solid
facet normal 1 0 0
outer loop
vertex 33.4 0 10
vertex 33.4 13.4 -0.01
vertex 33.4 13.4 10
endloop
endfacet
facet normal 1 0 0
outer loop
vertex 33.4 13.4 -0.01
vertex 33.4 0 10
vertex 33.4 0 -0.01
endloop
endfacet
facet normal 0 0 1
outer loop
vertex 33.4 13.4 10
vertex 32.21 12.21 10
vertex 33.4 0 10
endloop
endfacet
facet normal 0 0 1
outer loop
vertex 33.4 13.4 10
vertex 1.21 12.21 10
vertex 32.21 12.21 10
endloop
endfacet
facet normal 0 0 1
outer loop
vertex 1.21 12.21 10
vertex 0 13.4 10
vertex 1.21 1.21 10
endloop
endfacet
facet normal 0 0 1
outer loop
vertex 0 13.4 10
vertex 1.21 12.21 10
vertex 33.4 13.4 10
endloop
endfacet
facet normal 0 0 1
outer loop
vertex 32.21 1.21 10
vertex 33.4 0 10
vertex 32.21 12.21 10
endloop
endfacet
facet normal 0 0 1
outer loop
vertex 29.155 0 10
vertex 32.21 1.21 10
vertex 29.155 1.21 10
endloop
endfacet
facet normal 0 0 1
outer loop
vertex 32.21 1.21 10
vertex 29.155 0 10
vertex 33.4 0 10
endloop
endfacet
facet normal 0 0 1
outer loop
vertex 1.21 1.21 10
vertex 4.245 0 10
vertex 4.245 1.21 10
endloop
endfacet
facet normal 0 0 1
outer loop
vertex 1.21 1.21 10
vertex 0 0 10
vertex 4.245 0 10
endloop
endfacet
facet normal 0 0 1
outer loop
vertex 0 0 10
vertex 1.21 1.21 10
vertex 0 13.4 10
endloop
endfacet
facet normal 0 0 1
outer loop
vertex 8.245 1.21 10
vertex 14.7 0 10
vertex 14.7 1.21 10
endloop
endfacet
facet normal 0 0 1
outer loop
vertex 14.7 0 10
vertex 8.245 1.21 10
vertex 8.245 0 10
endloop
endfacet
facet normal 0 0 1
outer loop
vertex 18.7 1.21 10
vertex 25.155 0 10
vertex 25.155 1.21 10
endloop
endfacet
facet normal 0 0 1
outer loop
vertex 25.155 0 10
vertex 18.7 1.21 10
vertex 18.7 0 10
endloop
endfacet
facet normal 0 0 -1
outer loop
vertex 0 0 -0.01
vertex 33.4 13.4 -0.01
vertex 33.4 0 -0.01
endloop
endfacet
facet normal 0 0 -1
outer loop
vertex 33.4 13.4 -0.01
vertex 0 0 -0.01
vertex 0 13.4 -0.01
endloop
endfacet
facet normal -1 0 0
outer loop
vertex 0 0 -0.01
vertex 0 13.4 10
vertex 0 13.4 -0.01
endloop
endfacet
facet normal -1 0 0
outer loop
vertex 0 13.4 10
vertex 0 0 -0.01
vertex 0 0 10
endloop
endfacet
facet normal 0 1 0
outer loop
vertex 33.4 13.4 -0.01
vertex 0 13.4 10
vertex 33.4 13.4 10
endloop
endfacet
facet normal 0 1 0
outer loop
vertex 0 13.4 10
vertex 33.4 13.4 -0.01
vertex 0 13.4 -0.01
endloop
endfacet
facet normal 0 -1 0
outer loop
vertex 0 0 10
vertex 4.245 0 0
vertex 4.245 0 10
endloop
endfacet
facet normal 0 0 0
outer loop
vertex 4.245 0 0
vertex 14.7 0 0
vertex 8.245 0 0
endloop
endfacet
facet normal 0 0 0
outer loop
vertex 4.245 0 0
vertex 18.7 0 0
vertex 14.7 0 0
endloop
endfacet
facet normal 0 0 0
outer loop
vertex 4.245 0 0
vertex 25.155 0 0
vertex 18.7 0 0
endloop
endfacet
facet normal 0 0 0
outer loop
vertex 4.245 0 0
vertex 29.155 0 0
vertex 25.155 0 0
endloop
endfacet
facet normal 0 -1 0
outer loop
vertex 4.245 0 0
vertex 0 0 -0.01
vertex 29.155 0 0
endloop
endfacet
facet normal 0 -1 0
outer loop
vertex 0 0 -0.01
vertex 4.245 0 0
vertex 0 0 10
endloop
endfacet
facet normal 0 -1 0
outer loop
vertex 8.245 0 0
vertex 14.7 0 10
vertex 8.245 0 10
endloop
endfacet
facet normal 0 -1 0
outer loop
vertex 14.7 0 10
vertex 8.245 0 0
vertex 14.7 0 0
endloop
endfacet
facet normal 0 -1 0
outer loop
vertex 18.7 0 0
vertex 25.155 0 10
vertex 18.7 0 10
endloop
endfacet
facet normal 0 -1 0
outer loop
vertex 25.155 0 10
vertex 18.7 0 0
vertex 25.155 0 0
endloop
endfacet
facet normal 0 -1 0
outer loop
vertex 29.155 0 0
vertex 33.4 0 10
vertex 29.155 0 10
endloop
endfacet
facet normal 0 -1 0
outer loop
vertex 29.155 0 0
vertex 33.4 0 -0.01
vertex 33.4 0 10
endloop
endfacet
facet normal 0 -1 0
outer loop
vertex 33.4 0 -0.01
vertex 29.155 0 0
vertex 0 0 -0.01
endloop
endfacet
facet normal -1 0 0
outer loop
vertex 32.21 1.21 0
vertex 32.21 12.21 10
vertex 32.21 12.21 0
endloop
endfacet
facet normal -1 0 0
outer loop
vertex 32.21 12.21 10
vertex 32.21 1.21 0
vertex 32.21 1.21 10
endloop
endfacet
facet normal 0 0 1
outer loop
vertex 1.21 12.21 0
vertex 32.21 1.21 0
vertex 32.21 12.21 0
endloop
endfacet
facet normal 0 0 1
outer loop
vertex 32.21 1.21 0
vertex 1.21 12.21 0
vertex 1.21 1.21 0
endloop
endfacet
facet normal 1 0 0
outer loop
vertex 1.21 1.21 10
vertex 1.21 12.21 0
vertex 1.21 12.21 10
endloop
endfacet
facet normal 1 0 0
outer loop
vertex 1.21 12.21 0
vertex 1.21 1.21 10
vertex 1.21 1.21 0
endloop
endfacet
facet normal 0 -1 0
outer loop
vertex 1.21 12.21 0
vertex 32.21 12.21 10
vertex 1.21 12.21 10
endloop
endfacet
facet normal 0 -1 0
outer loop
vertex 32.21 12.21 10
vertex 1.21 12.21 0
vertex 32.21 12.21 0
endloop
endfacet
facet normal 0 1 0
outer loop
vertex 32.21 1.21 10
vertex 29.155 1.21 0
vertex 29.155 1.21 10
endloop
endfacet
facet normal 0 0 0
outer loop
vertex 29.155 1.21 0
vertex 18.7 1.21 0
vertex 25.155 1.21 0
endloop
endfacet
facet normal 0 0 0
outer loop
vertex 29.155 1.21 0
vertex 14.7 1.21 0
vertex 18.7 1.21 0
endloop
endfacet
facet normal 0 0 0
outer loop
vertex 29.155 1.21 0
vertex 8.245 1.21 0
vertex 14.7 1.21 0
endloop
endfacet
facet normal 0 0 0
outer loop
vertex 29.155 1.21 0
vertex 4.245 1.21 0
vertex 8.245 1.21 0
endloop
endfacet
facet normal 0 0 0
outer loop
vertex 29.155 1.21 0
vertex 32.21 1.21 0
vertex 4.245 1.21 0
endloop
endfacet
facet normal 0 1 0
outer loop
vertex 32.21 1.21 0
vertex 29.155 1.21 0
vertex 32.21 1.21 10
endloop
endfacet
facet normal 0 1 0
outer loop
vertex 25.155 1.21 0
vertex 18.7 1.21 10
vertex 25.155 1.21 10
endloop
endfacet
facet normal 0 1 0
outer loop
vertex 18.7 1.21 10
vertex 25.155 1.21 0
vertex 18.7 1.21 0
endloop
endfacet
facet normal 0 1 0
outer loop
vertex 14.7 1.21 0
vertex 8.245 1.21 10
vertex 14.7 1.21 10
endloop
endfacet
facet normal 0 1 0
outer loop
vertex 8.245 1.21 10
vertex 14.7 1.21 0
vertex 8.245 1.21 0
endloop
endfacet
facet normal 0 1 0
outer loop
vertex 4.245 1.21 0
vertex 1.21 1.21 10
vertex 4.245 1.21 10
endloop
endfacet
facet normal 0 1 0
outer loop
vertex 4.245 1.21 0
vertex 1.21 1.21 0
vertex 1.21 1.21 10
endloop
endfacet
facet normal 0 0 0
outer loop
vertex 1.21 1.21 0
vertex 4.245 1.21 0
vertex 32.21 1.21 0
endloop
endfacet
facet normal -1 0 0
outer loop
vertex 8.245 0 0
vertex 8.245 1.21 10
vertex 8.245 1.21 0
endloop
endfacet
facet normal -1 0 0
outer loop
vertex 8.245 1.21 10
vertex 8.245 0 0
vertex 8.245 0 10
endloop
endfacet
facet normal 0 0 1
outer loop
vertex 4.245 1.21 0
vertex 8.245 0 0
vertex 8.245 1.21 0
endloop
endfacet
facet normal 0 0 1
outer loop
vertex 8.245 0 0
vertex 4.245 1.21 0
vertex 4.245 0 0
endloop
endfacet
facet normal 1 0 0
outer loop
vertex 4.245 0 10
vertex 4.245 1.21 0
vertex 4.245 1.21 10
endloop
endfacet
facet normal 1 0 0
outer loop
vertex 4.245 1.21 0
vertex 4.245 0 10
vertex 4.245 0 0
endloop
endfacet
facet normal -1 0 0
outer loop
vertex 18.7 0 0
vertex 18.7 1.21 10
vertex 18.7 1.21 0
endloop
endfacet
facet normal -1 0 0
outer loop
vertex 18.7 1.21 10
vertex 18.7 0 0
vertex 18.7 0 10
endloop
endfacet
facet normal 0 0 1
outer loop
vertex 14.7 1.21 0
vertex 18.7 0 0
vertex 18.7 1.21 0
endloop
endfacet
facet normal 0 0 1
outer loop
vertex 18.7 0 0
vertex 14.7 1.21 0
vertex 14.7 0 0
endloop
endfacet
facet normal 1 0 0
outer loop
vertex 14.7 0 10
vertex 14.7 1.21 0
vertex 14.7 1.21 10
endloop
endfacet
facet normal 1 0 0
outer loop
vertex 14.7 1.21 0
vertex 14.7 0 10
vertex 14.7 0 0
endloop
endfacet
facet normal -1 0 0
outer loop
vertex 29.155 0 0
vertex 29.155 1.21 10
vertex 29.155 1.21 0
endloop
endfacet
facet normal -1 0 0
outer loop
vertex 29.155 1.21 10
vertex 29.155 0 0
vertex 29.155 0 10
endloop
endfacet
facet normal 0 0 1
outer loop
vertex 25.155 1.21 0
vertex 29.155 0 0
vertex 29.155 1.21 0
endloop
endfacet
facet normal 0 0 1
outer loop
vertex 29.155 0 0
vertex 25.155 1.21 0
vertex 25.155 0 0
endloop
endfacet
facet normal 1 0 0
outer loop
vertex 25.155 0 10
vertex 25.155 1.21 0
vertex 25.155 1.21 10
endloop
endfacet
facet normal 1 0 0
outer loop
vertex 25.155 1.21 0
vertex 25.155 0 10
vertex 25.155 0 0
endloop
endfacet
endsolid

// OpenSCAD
// file: ../../Base/Rotation.scad
// Fischertechnik Box Foundation
// Geometry Helpers Rotation

include <PlacementOptions.scad>

// getRotatedSpace(space, rotation=NoRotation)
// Rotates the space dependent on the specified rotation

function getRotatedSpace(space, rotation=NoRotation) = [
    (rotation == Rotate90 || rotation == Rotate270) ? space.y : space.x,
    (rotation == Rotate90 || rotation == Rotate270) ? space.x : space.y
];

// Rotates the given space around the fixed left lower corner
// space = the space the children needs as width/depth list [width,depth]
// rotation = 0 Rotate0 degrees, 1 Rotate90 degrees, 2 Rotate180 degrees, 3 Rotate270 degrees (equivalent to -90)

module RotateFix(space, rotation=NoRotation) {
    dy = (rotation == Rotate0 || rotation == Rotate270) ? 0 :
        (rotation == Rotate90) ? space.x :
        space.y;
    dx = (rotation < Rotate180) ? 0 :
        (rotation == Rotate180) ? space.x :
        space.y;
    
    translate([dx, dy, 0])
        rotate([0, 0, rotations[rotation]])
            children();
}
// file: ../../Base/Alignment.scad
// Fischertechnik Box Foundation
// Geometry Helpers Alignment

include <PlacementOptions.scad>

// getAlignedX(elementWidth, spaceWidth, align=AlignRight, offset=0)
// Gets the aligned X offset of an element with the given
// width in the given space.
// elementWidth = The width of the element to positon
// spaceWidth = The space where the element should be aligned
// align = 0 AlignLeft, 1 AlignCenter, 2 AlignRight
// offset = an optional offset from the aligned position. When
// aligned left or centered, then positive values are in X direction.
// When aligned right then positive values are in negative X direction.

function getAlignedX(elementWidth, spaceWidth, align=AlignRight, offset=0) =
    (align == AlignLeft) ?
        offset :
        ((align == AlignCenter) ?
        (spaceWidth - elementWidth)/2 + offset :
        spaceWidth - offset - elementWidth);

// getAlignedY(elementDepth, spaceDepth, align=AlignTop, offset=0)
// Gets the aligned Y offset of an element with the given
// depth in the given space.
// elementDepth = The depth of the element to positon
// spaceDepth = The space where the element should be aligned
// align = 0 AlignBottom, 1 AlignCenter, 2 AlignTop
// offset = an optional offset from the aligned position. When
// aligned bottom or centered, then positive values are in Y direction.
// When aligned top then positive values are in negative Y direction.

function getAlignedY(elementDepth, spaceDepth, align=AlignTop, offset=0) =
    (align == AlignBottom) ?
        offset :
        ((align == AlignCenter) ?
        (spaceDepth - elementDepth)/2 + offset :
        spaceDepth - offset - elementDepth);
// file: ../../Base/PlacementOptions.scad
// Fischertechnik Box Foundation
// Placement Options

// Alignment
NoAlign = 0;
AlignLeft = 1;
AlignBottom = 2;
AlignCenter = 3;
AlignRight = 4;
AlignTop = 5;

// Element rotation degree steps
rotations = [0, -90, -180, -270];

// Rotation
NoRotation = 0;
Rotate0 = 0;
Rotate90 = 1;
Rotate180 = 2;
Rotate270 = 3;

// Docking (seen from above)
NoDock = -1;
DockLeft = 0;
DockTop = 1;
DockRight = 2;
DockCorner = 2;
DockBottom = 3;

// Web corners
LowerLeft = 0;
UpperLeft = 1;
UpperRight = 2;
LowerRight = 3;

// Web position relative to corner
LeftOfCorner = 0;
RightOfCorner = 1;

// Rails direction
Horizontal = true;
Vertical = false;
// file: ../../Base/Boxes.scad
// Fischertechnik Box Foundation
// Pre-designed Boxes

use <Constants.scad>

include <PlacementOptions.scad>

box190Width = 190;
box190Depth = 130;
box130Width = 130;
box130Depth = 95;

// Values are from an original ec3 box
topBottomDifference = 1.5;
outerHeight = 40;
baseThickness = 1.8;
innerHeight = outerHeight - baseThickness;
stackExcess = 5.7;
radius = 3.5;
wallThickness = 1.5;
tolerance = 0.2;

boxWallThickness = wallThickness;
boxBaseThickness = baseThickness;
boxWebWidth = 3.0;

// getBoxWallThickness()
// Gets the wall thickness of a Fischertechnik Box
function getBoxWallThickness() = boxWallThickness;

// getBoxUsageHeight(height = 38.2)
// Gets the usable height of a Fischertechnik box
// height = Outer height of the box from the bottom to the upper edge.
function getBoxUsageHeight(height = outerHeight) = height - baseThickness - stackExcess;

// getBoxInnerHeight()
// Gets the inner height of a Fischertechnik box, including the stack excess
function getBoxInnerHeight() = innerHeight;

// getBoxBaseThickness()
// Gets the thickness of the Fischertechnik box base.
function getBoxBaseThickness() = boxBaseThickness;

// getBoxWebWidth()
// Gets the width of a box web
function getBoxWebWidth() = boxWebWidth;

// getBox190Space()
// Gets the usable inner space of a Box 190 as an x/y-list
function getBox190Space() = [
    box190Width - 2*getBoxWallThickness() - topBottomDifference, 
    box190Depth - 2*getBoxWallThickness() - topBottomDifference ];

// RoundedCornerPlate(width, depth, height, radius)
// Creates a body plate with rounded corners for a box. Used
// also to create the complete box with the hull module.
// width = Width of the plate
// depth = depth of the plate 
// height = thickness of the plate
// radius = radius of the rounded corner
module RoundedCornerPlate(width, depth, height, radius) {
    translate([radius, radius])
    hull() {
        w = width-2*radius;
        d = depth-2*radius;
        cube([w, d, height]);
        cylinder(height, r=radius, $fn=getFragments());
        translate([w, 0])
            cylinder(height, r=radius, $fn=getFragments());
        translate([w, d])
            cylinder(height, r=radius, $fn=getFragments());
        translate([0, d])
            cylinder(height, r=radius, $fn=getFragments());
    }
}

// BoxBase(width, depth)
// Creates an empty stackable Fischertechnik compatible box
// width = Outer width of the box (190, 130, ...)
// depth = Outer depth of the box (130, 95, ...)

module BoxBase(width, depth, height=outerHeight) {    
    thinPlate = 0.01;

    innerHeight = height - baseThickness;    
    
    module Body(tolerance=tolerance) {
        hull() {
            // Bottom with tolerance to fit into the original boxes when stacked
            translate([-wallThickness+tolerance, -wallThickness+tolerance, -baseThickness])
                RoundedCornerPlate(width-topBottomDifference-2*tolerance, depth-topBottomDifference-2*tolerance, thinPlate, radius);
            
            // Top
            translate([-wallThickness-topBottomDifference/2, -wallThickness-topBottomDifference/2, innerHeight-thinPlate])
                RoundedCornerPlate(width, depth, thinPlate, radius);
         }
    }

    module Cutoff() {
        hull() {
            coWidth = width - 2*wallThickness;
            coDepth = depth - 2*wallThickness;
            
            // Bottom
            RoundedCornerPlate(coWidth-topBottomDifference, coDepth-topBottomDifference, thinPlate, radius);

            // Top
            translate([-topBottomDifference/2, -topBottomDifference/2, innerHeight+thinPlate]) 
                RoundedCornerPlate(coWidth, coDepth, thinPlate, radius);
        }
    }
    
    difference() {        
        Body();
        Cutoff();
        stackOffset = innerHeight - stackExcess;
        translate([0, 0, stackOffset + baseThickness])
            Body(tolerance=0);
    }
}

// Creates the Fischertechnik empty box 130x190 mm and places it at position 0,0
// 190x130 are the outer sizes, the inner space is slightly smaller. Use getBox190Space() to get the inner sizes.
// The box is positioned that the usable inner space is at the 0,0,0 position.

module Box190() {
    BoxBase(box190Width, box190Depth);
}

// Gets the usable inner space of a Box 130 as an x/y-list
function getBox130Space() = [
    box130Width - 2*getBoxWallThickness() - topBottomDifference, 
    box130Depth - 2*getBoxWallThickness() - topBottomDifference ];

// Creates the Fischertechnik empty box 95x130 mm and places it at position 0,0
// 190x130 are the outer sizes, the inner space is slightly smaller. Use getBox190Space() to get the inner sizes.
// The box is positioned that the usable inner space is at the 0,0,0 position.

module Box130() {
    BoxBase(box130Width, box130Depth);
}

// Creates a web at the specified box walls
// corner 0 = LowerLeft, 1 = UpperLeft, 2 = UpperRight, 3 = LowerRight
// side 0 = LeftOfCorner, 1 = RightOfCorner
// distance = Distance in mm from the corner
// boxSpace = inner width and depth of the box (default: Box 190)
// webWidth = length of the web (default is 3 mms)
// webThickness = thickness of the web (default is 1 mm)
// height = Height of the web (standard is getBoxUsageHeight())
// sink = How much of the web is sunk into the wall

module BoxWeb(
    corner, 
    side, 
    distance, 
    boxSpace=getBox190Space(), 
    webWidth=getBoxWebWidth(), 
    webThickness=1.0, 
    height=getBoxUsageHeight(),
    sink = getBoxWallThickness()/2) {
    width = (corner % 2 == 0) ? 
            (side == LeftOfCorner ? webWidth : webThickness) :
            (side == LeftOfCorner ? webThickness : webWidth);

    depth = (corner % 2 == 0) ? 
            (side == RightOfCorner ? webWidth : webThickness) :
            (side == RightOfCorner ? webThickness : webWidth);
    
    xDiff = corner == LowerLeft ? 
                (side == LeftOfCorner ? -sink : distance) :
            (corner == UpperLeft ?                
                (side == LeftOfCorner ? distance : -sink) :
            (corner == UpperRight ?
                (side == LeftOfCorner ? boxSpace.x-webWidth+sink : boxSpace.x-distance-webThickness) :
                (side == LeftOfCorner ? boxSpace.x-distance-webThickness: boxSpace.x-webWidth+sink)));

    yDiff = corner == LowerLeft ? 
                (side == RightOfCorner ? -sink : distance) :
            (corner == UpperLeft ?
                (side == RightOfCorner ? boxSpace.y-distance-webThickness : boxSpace.y-webWidth+sink) :
            (corner == UpperRight ?
                (side == RightOfCorner ? boxSpace.y-webWidth+sink : boxSpace.y-distance-webThickness) :
                (side == RightOfCorner ? distance : -sink)));
    
    translate([xDiff, yDiff, -getExcess()])
        cube([width, depth, height + 2*getExcess()]);
}
// file: ../../Base/Placement.scad
// Fischertechnik Box Foundation
// Geometry Helpers Placement

use <Constants.scad>
use <Alignment.scad>
use <Rotation.scad>
use <Boxes.scad>

include <PlacementOptions.scad>

// Place(x=0, y=0, elementSpace=[0,0], alignX=AlignLeft, alignY=AlignBottom, rotation=Rotate0, boxSpace=getBox190Space())
// Places the child at the specified position
// y = Y-Position. This is a relative position when an X aligment is specified.
// x = X-Position. This is a relative position when an Y aligment is specified.
// elementSpace = space of the element to be placed [x,y]
// alignX = -1=NoAlign, 0 AlignLeft, 1 AlignCenter, 3 AlignRight (elementSpace and boxSpace required!)
// alignY = -1=NoAlign, 2 AlignBottom, 1 AlignCenter, 4 AlignTop (elementSpace and boxSpace required!)
// rotation = 0 Rotate0 0 degrees, 1 Rotate90 90 degrees, 
// 2 Rotate180 180 degrees, 3 Rotate270 270 degrees (equivalent to -90)
// boxSpace = Inner space of the box where the placement occurs [x,y] - default is Box 190x130 inner space

module Place(x=0, y=0, elementSpace=[0,0], 
  alignX=AlignLeft, alignY=AlignBottom, 
  rotation=NoRotation, boxSpace=getBox190Space()) {

    module Position(x, y, space, rotation=Rotate0) {
        translate([x, y, 0])
            RotateFix(space, rotation)
                children();
    }

    space = getRotatedSpace(elementSpace, rotation);
    alignedX = getAlignedX(space.x, boxSpace.x, alignX, x);
    alignedY = getAlignedY(space.y, boxSpace.y, alignY, y);
    Position(alignedX, alignedY, elementSpace, rotation)
        children();
}

// Center(space=getBox130Space(), elementSpace=[0,0])
// space = Space where the children is centered. For cylinder use centered=true and no elementSpace.
// elementSpace = space of the element to be centered [x,y]

module Center(space=getBox190Space(), elementSpace=[0,0]) {
    Place(elementSpace=elementSpace, boxSpace=space, alignX=AlignCenter, alignY=AlignCenter)
        children();
}

// CenterHorizontal(width=0, y=0, offset=0, space=getBox130Space())
// width = Width of the element to be placed.
// y = Y position of the element
// offset = Offset from the center position (negative will be left of the center)
// space = Space where the element is placed

module CenterHorizontal(width=0, y=0, offset=0, space=getBox190Space()) {
    Place(x=offset, y=y, elementSpace=[width, 0], boxSpace=space, alignX=AlignCenter)
        children(0);
}

// CenterVertical(depth=0, x=0, offset=0, space=getBox130Space())
// depth = Depth of the element to be placed.
// x = X position of the element
// offset = Offset from the center position (negative will be down of the center)
// space = Space where the element is placed

module CenterVertical(depth=0, x=0, offset=0, space=getBox190Space()) {
    Place(x=x, y=offset, elementSpace=[0, depth], boxSpace=space, alignY=AlignCenter)
        children(0);
}

// getIsVertical(align)
// True if the specified alignment needs a vertical orientation for a divider (AlignRight, AlignLeft)

function getIsVertical(align) = (align == AlignRight || align == AlignLeft);

// getIsHorizontal(align)
// True if the specified alignment needs a horizontal orientation for a divider (AlignTop, AlignBottom)

function getIsHorizontal(align) = (align == AlignTop || align == AlignBottom);
// file: ../../Base/Constants.scad
// Fischertechnik Box Foundation
// Constants

// Constant values necessary for multiple elements

// Base constants
dividerThickness = 1.2;
excess = 0.01;
fragments = 90;
tolerance = 0.8;

// Gets the thickness of a divider 
function getDividerThickness() = dividerThickness;

// Gets the excess that is used to merge walls into each other
function getExcess() = excess;

// Gets amount of fragments of a cylinder
function getFragments() = fragments;

// Gets the inner tolerance of a frame to each side
function getTolerance() = tolerance;


// Fischertechnik specific constants
axisDiameter = 4;
axisBottomDiameter = axisDiameter + 1;
axisTolerance = 0.2;
axisLockingLength = 8;

// Gets axis diameter of Fischertechnik axis
function getAxisDiameter() = axisDiameter;

// Gets axis diameter tolerance (subtracted for element axis)
function getAxisTolerance() = axisTolerance;

// Gets the axis diameter for standing axis
function getStandAxisDiameter() = getAxisDiameter() - getAxisTolerance();

// Gets axis bottom diameter for thicker part at the bottom
function getAxisBottomDiameter() = axisBottomDiameter;

// Gets the lengthh of the locking part of a locking axis
function getAxisLockingLength() = axisLockingLength;

pinHeight = 2.5;
pinTolerance = 0.2;

// gets the height of a connecting pin
function getPinHeight() = pinHeight;

// gets the connecting pin height tolerance
function getPinTolerance() = pinTolerance;

standardEdgeDistance = 2.5;
standardWebDistance = 11.5;
standardCornerLength = 15;

// gets the standard distance to the wall of the box for dockable frames with webs
function getStandardEdgeDistance() = standardEdgeDistance;

// gets the standard distance of each web to the corner of the dockable frame
function getStandardWebDistance() = standardWebDistance;

// gets the standard length of the corner walls of a dockable frame
function getStandardCornerLength() = standardCornerLength;

tubeWallFactor = 0.8;

// gets the wall thickness of a tube.
function getTubeWallThickness() = tubeWallFactor * getDividerThickness();

smallPartsFrameHeight = 20;

// gets the frame height for docked small parts boxes.
function getSmallPartsFrameHeight() = smallPartsFrameHeight;

hubRingDiameter = 19.5;
hubRingLevelDiameter = 21;

// gets the diameter of a tube matching the inner ring of a wheel
function getHubRingDiameter() = hubRingDiameter;

// gets the diameter of a hub tube with a thicker diameter
function getHubRingLevelDiameter() = hubRingLevelDiameter;
// main file
// Fischertechnik Box Foundation
// ModelBase
// Test FrameBottomCutoffs

use <../../Base/Constants.scad>
use <../../ModelBase/Simple.scad>

width = 10;
count = 3;
cutoffWidth = 4;
tolerance = 1;

difference() {
    volume = [width * count,10,10];
    Frame(volume, tolerance);
    FrameBottomCutoffs(volume, count, cutoffWidth, tolerance);
}
